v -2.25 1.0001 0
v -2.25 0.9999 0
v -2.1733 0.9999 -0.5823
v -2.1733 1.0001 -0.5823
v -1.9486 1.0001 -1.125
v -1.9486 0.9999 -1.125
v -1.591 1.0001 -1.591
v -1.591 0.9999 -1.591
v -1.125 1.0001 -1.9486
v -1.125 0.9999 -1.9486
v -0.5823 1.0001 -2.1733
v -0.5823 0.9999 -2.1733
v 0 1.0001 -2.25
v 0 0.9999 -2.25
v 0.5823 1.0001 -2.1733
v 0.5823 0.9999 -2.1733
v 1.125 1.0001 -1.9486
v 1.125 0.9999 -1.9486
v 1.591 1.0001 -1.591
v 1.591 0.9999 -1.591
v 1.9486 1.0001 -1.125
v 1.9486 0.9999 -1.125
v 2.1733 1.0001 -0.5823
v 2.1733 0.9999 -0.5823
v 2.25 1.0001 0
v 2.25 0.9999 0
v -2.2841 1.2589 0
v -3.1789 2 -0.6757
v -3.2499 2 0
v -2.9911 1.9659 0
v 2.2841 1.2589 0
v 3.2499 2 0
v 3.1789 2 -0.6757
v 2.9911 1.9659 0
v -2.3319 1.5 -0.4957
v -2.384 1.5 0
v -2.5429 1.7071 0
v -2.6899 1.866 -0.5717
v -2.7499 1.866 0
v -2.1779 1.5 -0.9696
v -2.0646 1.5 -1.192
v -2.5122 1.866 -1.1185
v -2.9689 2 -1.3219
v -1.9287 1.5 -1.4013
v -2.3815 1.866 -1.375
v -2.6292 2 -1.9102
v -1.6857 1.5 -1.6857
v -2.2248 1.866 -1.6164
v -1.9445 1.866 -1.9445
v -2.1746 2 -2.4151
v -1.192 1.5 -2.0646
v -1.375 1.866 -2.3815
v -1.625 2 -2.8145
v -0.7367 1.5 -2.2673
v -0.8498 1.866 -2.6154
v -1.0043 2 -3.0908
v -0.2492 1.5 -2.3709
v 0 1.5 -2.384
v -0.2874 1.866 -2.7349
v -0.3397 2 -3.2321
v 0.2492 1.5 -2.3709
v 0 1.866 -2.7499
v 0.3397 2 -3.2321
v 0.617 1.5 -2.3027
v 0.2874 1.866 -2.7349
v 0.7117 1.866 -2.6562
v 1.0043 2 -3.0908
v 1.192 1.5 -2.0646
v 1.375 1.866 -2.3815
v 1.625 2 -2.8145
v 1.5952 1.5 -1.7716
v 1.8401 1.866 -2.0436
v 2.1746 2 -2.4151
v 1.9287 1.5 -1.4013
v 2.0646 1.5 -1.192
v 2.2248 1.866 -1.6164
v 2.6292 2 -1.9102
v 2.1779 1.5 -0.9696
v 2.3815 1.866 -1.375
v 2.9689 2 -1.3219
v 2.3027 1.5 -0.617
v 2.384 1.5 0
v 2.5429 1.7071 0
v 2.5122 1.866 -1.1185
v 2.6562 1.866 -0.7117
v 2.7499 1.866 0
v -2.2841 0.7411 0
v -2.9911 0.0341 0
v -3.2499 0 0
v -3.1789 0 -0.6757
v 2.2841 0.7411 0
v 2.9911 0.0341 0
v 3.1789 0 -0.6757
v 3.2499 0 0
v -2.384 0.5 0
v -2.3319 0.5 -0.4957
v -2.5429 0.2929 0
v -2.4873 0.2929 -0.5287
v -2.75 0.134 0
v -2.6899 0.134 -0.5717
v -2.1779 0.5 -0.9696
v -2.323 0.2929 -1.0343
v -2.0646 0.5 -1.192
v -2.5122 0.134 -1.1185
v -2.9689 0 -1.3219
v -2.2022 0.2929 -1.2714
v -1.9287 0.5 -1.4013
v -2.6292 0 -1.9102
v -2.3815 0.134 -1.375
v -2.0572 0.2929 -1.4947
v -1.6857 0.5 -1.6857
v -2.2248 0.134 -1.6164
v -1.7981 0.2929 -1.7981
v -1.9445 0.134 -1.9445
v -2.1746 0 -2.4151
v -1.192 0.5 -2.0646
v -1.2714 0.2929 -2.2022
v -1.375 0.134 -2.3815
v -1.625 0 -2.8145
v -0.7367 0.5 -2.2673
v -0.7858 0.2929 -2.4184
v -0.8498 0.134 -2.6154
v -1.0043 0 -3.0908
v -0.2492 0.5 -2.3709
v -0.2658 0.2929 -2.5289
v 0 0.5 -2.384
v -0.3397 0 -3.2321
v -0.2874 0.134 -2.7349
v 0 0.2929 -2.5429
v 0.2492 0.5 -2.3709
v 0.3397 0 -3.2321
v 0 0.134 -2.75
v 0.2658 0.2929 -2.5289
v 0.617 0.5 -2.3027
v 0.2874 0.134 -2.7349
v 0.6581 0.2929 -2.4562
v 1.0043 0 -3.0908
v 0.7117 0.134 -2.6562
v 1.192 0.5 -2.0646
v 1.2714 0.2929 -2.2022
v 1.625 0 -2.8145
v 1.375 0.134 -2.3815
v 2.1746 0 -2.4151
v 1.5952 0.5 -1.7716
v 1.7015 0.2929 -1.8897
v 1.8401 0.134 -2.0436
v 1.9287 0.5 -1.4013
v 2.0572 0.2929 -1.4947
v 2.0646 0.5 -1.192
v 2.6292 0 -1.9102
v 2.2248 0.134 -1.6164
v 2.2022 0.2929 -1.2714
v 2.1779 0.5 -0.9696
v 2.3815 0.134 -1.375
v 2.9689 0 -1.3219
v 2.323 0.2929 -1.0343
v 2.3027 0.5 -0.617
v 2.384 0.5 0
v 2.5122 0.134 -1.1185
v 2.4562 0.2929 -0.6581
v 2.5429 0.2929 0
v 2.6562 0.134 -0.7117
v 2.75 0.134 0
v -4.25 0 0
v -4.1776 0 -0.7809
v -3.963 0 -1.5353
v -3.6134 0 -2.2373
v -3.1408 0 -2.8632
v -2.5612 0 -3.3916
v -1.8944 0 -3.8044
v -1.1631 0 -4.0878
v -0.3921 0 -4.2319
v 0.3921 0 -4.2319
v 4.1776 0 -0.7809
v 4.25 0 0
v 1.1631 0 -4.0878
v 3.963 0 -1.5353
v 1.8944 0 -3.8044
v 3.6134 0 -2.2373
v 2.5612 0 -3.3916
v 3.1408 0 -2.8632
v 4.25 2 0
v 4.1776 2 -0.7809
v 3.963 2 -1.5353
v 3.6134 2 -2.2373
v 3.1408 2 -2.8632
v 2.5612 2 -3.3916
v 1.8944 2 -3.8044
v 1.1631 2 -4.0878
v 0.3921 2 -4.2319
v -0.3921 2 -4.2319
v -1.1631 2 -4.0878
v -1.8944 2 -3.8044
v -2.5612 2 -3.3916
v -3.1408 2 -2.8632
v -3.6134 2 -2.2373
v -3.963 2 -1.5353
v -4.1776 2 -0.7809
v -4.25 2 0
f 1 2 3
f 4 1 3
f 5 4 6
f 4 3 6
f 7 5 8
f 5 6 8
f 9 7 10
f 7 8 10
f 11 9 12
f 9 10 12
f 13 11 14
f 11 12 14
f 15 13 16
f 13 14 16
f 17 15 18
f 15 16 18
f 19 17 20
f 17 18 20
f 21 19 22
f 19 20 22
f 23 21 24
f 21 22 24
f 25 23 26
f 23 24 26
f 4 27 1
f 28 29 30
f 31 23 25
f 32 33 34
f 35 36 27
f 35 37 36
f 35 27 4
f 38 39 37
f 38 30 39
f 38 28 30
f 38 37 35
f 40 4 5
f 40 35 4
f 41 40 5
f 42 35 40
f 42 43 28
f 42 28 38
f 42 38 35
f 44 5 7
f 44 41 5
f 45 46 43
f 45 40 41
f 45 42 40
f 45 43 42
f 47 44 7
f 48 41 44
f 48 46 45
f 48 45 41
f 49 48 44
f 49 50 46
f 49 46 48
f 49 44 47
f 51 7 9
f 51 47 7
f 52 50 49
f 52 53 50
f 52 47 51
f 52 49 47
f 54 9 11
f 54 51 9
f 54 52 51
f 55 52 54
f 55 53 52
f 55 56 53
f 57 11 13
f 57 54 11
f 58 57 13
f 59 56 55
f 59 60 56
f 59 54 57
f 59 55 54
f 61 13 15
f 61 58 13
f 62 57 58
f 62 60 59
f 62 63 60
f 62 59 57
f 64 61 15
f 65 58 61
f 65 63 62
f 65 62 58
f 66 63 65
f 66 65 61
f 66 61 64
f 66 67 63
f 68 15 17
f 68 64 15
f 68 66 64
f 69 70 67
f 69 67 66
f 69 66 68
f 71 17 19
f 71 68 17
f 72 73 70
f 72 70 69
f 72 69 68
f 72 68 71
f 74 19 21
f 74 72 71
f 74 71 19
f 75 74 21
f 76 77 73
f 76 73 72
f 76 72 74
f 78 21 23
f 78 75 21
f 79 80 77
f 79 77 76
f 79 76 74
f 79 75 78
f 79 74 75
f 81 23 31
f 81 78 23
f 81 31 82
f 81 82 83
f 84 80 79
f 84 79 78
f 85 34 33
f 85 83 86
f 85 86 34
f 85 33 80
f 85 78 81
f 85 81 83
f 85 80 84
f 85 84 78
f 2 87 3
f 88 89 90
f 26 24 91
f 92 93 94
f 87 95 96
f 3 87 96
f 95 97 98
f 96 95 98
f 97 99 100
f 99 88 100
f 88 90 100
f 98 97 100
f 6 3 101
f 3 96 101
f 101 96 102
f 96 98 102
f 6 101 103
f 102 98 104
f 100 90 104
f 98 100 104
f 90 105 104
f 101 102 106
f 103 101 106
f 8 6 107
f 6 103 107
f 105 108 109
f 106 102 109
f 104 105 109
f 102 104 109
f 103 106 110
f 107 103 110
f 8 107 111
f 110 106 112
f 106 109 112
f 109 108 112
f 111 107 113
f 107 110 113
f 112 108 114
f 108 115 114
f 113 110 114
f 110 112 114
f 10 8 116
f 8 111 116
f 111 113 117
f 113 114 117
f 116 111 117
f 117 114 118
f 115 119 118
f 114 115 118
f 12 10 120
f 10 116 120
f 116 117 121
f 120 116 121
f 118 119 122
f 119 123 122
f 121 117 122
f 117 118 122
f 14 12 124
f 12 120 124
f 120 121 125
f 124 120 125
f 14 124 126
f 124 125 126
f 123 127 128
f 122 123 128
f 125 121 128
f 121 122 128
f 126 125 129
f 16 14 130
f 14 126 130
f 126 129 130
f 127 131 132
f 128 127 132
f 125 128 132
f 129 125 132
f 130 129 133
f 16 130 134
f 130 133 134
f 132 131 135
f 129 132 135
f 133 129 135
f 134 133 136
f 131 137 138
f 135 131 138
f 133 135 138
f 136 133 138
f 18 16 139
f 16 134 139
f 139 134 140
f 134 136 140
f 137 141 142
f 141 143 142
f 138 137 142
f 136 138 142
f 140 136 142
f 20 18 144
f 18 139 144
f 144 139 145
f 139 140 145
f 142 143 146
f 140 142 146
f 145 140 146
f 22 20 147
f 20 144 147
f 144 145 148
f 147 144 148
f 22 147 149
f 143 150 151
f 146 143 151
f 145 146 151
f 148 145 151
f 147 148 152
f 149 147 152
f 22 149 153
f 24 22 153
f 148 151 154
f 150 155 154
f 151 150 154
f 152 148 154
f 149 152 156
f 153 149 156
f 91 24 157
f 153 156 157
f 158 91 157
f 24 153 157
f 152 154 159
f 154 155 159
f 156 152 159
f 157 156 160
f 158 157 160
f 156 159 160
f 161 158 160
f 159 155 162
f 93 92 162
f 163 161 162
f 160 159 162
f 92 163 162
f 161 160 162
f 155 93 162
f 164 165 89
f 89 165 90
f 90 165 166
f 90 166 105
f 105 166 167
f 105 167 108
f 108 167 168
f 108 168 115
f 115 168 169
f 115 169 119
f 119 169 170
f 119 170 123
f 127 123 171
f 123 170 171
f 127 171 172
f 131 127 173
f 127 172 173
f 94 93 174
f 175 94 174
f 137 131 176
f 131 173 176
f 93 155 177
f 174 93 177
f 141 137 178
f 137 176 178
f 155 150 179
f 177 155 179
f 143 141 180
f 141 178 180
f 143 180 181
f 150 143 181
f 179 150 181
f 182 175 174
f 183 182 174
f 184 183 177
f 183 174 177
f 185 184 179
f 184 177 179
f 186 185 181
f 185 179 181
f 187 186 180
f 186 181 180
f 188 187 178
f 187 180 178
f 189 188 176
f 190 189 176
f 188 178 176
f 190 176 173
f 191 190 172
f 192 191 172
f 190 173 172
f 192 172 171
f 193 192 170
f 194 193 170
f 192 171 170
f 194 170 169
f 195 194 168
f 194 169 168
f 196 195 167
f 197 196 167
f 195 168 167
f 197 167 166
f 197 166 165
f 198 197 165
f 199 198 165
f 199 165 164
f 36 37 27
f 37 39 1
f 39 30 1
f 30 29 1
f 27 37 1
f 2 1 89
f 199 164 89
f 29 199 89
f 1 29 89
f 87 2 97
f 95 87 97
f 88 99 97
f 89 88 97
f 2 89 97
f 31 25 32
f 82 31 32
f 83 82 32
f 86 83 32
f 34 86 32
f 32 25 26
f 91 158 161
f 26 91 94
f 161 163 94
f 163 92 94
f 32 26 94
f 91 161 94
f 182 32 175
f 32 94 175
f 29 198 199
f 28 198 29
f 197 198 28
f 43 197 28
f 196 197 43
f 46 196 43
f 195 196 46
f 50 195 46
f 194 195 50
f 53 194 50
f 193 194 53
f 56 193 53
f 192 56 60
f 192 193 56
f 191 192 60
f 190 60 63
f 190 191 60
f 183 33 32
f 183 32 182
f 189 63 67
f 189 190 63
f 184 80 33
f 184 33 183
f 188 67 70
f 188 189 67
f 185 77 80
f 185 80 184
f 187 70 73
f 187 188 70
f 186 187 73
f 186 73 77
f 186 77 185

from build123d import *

# Parameters (mm, degrees)
BOSS_EXTRUDE1_DEPTH = 2
FILLET1_R           = 1


with BuildPart() as part:
    # Sketch1 → Boss-Extrude1 (new body)
    with BuildSketch(Plane(origin=(0, 0, 0), x_dir=(1, 0, 0), z_dir=(0, 1, 0))):
        with BuildLine():
            Line((-4.25, 0), (-2.25, 0))
            ThreePointArc((-2.25, 0), (0, 2.25), (2.25, 0))
            Line((2.25, 0), (4.25, 0))
            ThreePointArc((4.25, 0), (0, 4.25), (-4.25, 0))
        make_face()
    extrude(amount=BOSS_EXTRUDE1_DEPTH)

    # Fillet1
    fillet1_edges = [part.edges().sort_by_distance(p)[0] for p in [
        (0, 0, -2.25),
        (0, 2, -2.25),
    ]]
    fillet(fillet1_edges, radius=FILLET1_R - 0.0001)  # a hair under: the kernel refuses the full size


solid = part.part
